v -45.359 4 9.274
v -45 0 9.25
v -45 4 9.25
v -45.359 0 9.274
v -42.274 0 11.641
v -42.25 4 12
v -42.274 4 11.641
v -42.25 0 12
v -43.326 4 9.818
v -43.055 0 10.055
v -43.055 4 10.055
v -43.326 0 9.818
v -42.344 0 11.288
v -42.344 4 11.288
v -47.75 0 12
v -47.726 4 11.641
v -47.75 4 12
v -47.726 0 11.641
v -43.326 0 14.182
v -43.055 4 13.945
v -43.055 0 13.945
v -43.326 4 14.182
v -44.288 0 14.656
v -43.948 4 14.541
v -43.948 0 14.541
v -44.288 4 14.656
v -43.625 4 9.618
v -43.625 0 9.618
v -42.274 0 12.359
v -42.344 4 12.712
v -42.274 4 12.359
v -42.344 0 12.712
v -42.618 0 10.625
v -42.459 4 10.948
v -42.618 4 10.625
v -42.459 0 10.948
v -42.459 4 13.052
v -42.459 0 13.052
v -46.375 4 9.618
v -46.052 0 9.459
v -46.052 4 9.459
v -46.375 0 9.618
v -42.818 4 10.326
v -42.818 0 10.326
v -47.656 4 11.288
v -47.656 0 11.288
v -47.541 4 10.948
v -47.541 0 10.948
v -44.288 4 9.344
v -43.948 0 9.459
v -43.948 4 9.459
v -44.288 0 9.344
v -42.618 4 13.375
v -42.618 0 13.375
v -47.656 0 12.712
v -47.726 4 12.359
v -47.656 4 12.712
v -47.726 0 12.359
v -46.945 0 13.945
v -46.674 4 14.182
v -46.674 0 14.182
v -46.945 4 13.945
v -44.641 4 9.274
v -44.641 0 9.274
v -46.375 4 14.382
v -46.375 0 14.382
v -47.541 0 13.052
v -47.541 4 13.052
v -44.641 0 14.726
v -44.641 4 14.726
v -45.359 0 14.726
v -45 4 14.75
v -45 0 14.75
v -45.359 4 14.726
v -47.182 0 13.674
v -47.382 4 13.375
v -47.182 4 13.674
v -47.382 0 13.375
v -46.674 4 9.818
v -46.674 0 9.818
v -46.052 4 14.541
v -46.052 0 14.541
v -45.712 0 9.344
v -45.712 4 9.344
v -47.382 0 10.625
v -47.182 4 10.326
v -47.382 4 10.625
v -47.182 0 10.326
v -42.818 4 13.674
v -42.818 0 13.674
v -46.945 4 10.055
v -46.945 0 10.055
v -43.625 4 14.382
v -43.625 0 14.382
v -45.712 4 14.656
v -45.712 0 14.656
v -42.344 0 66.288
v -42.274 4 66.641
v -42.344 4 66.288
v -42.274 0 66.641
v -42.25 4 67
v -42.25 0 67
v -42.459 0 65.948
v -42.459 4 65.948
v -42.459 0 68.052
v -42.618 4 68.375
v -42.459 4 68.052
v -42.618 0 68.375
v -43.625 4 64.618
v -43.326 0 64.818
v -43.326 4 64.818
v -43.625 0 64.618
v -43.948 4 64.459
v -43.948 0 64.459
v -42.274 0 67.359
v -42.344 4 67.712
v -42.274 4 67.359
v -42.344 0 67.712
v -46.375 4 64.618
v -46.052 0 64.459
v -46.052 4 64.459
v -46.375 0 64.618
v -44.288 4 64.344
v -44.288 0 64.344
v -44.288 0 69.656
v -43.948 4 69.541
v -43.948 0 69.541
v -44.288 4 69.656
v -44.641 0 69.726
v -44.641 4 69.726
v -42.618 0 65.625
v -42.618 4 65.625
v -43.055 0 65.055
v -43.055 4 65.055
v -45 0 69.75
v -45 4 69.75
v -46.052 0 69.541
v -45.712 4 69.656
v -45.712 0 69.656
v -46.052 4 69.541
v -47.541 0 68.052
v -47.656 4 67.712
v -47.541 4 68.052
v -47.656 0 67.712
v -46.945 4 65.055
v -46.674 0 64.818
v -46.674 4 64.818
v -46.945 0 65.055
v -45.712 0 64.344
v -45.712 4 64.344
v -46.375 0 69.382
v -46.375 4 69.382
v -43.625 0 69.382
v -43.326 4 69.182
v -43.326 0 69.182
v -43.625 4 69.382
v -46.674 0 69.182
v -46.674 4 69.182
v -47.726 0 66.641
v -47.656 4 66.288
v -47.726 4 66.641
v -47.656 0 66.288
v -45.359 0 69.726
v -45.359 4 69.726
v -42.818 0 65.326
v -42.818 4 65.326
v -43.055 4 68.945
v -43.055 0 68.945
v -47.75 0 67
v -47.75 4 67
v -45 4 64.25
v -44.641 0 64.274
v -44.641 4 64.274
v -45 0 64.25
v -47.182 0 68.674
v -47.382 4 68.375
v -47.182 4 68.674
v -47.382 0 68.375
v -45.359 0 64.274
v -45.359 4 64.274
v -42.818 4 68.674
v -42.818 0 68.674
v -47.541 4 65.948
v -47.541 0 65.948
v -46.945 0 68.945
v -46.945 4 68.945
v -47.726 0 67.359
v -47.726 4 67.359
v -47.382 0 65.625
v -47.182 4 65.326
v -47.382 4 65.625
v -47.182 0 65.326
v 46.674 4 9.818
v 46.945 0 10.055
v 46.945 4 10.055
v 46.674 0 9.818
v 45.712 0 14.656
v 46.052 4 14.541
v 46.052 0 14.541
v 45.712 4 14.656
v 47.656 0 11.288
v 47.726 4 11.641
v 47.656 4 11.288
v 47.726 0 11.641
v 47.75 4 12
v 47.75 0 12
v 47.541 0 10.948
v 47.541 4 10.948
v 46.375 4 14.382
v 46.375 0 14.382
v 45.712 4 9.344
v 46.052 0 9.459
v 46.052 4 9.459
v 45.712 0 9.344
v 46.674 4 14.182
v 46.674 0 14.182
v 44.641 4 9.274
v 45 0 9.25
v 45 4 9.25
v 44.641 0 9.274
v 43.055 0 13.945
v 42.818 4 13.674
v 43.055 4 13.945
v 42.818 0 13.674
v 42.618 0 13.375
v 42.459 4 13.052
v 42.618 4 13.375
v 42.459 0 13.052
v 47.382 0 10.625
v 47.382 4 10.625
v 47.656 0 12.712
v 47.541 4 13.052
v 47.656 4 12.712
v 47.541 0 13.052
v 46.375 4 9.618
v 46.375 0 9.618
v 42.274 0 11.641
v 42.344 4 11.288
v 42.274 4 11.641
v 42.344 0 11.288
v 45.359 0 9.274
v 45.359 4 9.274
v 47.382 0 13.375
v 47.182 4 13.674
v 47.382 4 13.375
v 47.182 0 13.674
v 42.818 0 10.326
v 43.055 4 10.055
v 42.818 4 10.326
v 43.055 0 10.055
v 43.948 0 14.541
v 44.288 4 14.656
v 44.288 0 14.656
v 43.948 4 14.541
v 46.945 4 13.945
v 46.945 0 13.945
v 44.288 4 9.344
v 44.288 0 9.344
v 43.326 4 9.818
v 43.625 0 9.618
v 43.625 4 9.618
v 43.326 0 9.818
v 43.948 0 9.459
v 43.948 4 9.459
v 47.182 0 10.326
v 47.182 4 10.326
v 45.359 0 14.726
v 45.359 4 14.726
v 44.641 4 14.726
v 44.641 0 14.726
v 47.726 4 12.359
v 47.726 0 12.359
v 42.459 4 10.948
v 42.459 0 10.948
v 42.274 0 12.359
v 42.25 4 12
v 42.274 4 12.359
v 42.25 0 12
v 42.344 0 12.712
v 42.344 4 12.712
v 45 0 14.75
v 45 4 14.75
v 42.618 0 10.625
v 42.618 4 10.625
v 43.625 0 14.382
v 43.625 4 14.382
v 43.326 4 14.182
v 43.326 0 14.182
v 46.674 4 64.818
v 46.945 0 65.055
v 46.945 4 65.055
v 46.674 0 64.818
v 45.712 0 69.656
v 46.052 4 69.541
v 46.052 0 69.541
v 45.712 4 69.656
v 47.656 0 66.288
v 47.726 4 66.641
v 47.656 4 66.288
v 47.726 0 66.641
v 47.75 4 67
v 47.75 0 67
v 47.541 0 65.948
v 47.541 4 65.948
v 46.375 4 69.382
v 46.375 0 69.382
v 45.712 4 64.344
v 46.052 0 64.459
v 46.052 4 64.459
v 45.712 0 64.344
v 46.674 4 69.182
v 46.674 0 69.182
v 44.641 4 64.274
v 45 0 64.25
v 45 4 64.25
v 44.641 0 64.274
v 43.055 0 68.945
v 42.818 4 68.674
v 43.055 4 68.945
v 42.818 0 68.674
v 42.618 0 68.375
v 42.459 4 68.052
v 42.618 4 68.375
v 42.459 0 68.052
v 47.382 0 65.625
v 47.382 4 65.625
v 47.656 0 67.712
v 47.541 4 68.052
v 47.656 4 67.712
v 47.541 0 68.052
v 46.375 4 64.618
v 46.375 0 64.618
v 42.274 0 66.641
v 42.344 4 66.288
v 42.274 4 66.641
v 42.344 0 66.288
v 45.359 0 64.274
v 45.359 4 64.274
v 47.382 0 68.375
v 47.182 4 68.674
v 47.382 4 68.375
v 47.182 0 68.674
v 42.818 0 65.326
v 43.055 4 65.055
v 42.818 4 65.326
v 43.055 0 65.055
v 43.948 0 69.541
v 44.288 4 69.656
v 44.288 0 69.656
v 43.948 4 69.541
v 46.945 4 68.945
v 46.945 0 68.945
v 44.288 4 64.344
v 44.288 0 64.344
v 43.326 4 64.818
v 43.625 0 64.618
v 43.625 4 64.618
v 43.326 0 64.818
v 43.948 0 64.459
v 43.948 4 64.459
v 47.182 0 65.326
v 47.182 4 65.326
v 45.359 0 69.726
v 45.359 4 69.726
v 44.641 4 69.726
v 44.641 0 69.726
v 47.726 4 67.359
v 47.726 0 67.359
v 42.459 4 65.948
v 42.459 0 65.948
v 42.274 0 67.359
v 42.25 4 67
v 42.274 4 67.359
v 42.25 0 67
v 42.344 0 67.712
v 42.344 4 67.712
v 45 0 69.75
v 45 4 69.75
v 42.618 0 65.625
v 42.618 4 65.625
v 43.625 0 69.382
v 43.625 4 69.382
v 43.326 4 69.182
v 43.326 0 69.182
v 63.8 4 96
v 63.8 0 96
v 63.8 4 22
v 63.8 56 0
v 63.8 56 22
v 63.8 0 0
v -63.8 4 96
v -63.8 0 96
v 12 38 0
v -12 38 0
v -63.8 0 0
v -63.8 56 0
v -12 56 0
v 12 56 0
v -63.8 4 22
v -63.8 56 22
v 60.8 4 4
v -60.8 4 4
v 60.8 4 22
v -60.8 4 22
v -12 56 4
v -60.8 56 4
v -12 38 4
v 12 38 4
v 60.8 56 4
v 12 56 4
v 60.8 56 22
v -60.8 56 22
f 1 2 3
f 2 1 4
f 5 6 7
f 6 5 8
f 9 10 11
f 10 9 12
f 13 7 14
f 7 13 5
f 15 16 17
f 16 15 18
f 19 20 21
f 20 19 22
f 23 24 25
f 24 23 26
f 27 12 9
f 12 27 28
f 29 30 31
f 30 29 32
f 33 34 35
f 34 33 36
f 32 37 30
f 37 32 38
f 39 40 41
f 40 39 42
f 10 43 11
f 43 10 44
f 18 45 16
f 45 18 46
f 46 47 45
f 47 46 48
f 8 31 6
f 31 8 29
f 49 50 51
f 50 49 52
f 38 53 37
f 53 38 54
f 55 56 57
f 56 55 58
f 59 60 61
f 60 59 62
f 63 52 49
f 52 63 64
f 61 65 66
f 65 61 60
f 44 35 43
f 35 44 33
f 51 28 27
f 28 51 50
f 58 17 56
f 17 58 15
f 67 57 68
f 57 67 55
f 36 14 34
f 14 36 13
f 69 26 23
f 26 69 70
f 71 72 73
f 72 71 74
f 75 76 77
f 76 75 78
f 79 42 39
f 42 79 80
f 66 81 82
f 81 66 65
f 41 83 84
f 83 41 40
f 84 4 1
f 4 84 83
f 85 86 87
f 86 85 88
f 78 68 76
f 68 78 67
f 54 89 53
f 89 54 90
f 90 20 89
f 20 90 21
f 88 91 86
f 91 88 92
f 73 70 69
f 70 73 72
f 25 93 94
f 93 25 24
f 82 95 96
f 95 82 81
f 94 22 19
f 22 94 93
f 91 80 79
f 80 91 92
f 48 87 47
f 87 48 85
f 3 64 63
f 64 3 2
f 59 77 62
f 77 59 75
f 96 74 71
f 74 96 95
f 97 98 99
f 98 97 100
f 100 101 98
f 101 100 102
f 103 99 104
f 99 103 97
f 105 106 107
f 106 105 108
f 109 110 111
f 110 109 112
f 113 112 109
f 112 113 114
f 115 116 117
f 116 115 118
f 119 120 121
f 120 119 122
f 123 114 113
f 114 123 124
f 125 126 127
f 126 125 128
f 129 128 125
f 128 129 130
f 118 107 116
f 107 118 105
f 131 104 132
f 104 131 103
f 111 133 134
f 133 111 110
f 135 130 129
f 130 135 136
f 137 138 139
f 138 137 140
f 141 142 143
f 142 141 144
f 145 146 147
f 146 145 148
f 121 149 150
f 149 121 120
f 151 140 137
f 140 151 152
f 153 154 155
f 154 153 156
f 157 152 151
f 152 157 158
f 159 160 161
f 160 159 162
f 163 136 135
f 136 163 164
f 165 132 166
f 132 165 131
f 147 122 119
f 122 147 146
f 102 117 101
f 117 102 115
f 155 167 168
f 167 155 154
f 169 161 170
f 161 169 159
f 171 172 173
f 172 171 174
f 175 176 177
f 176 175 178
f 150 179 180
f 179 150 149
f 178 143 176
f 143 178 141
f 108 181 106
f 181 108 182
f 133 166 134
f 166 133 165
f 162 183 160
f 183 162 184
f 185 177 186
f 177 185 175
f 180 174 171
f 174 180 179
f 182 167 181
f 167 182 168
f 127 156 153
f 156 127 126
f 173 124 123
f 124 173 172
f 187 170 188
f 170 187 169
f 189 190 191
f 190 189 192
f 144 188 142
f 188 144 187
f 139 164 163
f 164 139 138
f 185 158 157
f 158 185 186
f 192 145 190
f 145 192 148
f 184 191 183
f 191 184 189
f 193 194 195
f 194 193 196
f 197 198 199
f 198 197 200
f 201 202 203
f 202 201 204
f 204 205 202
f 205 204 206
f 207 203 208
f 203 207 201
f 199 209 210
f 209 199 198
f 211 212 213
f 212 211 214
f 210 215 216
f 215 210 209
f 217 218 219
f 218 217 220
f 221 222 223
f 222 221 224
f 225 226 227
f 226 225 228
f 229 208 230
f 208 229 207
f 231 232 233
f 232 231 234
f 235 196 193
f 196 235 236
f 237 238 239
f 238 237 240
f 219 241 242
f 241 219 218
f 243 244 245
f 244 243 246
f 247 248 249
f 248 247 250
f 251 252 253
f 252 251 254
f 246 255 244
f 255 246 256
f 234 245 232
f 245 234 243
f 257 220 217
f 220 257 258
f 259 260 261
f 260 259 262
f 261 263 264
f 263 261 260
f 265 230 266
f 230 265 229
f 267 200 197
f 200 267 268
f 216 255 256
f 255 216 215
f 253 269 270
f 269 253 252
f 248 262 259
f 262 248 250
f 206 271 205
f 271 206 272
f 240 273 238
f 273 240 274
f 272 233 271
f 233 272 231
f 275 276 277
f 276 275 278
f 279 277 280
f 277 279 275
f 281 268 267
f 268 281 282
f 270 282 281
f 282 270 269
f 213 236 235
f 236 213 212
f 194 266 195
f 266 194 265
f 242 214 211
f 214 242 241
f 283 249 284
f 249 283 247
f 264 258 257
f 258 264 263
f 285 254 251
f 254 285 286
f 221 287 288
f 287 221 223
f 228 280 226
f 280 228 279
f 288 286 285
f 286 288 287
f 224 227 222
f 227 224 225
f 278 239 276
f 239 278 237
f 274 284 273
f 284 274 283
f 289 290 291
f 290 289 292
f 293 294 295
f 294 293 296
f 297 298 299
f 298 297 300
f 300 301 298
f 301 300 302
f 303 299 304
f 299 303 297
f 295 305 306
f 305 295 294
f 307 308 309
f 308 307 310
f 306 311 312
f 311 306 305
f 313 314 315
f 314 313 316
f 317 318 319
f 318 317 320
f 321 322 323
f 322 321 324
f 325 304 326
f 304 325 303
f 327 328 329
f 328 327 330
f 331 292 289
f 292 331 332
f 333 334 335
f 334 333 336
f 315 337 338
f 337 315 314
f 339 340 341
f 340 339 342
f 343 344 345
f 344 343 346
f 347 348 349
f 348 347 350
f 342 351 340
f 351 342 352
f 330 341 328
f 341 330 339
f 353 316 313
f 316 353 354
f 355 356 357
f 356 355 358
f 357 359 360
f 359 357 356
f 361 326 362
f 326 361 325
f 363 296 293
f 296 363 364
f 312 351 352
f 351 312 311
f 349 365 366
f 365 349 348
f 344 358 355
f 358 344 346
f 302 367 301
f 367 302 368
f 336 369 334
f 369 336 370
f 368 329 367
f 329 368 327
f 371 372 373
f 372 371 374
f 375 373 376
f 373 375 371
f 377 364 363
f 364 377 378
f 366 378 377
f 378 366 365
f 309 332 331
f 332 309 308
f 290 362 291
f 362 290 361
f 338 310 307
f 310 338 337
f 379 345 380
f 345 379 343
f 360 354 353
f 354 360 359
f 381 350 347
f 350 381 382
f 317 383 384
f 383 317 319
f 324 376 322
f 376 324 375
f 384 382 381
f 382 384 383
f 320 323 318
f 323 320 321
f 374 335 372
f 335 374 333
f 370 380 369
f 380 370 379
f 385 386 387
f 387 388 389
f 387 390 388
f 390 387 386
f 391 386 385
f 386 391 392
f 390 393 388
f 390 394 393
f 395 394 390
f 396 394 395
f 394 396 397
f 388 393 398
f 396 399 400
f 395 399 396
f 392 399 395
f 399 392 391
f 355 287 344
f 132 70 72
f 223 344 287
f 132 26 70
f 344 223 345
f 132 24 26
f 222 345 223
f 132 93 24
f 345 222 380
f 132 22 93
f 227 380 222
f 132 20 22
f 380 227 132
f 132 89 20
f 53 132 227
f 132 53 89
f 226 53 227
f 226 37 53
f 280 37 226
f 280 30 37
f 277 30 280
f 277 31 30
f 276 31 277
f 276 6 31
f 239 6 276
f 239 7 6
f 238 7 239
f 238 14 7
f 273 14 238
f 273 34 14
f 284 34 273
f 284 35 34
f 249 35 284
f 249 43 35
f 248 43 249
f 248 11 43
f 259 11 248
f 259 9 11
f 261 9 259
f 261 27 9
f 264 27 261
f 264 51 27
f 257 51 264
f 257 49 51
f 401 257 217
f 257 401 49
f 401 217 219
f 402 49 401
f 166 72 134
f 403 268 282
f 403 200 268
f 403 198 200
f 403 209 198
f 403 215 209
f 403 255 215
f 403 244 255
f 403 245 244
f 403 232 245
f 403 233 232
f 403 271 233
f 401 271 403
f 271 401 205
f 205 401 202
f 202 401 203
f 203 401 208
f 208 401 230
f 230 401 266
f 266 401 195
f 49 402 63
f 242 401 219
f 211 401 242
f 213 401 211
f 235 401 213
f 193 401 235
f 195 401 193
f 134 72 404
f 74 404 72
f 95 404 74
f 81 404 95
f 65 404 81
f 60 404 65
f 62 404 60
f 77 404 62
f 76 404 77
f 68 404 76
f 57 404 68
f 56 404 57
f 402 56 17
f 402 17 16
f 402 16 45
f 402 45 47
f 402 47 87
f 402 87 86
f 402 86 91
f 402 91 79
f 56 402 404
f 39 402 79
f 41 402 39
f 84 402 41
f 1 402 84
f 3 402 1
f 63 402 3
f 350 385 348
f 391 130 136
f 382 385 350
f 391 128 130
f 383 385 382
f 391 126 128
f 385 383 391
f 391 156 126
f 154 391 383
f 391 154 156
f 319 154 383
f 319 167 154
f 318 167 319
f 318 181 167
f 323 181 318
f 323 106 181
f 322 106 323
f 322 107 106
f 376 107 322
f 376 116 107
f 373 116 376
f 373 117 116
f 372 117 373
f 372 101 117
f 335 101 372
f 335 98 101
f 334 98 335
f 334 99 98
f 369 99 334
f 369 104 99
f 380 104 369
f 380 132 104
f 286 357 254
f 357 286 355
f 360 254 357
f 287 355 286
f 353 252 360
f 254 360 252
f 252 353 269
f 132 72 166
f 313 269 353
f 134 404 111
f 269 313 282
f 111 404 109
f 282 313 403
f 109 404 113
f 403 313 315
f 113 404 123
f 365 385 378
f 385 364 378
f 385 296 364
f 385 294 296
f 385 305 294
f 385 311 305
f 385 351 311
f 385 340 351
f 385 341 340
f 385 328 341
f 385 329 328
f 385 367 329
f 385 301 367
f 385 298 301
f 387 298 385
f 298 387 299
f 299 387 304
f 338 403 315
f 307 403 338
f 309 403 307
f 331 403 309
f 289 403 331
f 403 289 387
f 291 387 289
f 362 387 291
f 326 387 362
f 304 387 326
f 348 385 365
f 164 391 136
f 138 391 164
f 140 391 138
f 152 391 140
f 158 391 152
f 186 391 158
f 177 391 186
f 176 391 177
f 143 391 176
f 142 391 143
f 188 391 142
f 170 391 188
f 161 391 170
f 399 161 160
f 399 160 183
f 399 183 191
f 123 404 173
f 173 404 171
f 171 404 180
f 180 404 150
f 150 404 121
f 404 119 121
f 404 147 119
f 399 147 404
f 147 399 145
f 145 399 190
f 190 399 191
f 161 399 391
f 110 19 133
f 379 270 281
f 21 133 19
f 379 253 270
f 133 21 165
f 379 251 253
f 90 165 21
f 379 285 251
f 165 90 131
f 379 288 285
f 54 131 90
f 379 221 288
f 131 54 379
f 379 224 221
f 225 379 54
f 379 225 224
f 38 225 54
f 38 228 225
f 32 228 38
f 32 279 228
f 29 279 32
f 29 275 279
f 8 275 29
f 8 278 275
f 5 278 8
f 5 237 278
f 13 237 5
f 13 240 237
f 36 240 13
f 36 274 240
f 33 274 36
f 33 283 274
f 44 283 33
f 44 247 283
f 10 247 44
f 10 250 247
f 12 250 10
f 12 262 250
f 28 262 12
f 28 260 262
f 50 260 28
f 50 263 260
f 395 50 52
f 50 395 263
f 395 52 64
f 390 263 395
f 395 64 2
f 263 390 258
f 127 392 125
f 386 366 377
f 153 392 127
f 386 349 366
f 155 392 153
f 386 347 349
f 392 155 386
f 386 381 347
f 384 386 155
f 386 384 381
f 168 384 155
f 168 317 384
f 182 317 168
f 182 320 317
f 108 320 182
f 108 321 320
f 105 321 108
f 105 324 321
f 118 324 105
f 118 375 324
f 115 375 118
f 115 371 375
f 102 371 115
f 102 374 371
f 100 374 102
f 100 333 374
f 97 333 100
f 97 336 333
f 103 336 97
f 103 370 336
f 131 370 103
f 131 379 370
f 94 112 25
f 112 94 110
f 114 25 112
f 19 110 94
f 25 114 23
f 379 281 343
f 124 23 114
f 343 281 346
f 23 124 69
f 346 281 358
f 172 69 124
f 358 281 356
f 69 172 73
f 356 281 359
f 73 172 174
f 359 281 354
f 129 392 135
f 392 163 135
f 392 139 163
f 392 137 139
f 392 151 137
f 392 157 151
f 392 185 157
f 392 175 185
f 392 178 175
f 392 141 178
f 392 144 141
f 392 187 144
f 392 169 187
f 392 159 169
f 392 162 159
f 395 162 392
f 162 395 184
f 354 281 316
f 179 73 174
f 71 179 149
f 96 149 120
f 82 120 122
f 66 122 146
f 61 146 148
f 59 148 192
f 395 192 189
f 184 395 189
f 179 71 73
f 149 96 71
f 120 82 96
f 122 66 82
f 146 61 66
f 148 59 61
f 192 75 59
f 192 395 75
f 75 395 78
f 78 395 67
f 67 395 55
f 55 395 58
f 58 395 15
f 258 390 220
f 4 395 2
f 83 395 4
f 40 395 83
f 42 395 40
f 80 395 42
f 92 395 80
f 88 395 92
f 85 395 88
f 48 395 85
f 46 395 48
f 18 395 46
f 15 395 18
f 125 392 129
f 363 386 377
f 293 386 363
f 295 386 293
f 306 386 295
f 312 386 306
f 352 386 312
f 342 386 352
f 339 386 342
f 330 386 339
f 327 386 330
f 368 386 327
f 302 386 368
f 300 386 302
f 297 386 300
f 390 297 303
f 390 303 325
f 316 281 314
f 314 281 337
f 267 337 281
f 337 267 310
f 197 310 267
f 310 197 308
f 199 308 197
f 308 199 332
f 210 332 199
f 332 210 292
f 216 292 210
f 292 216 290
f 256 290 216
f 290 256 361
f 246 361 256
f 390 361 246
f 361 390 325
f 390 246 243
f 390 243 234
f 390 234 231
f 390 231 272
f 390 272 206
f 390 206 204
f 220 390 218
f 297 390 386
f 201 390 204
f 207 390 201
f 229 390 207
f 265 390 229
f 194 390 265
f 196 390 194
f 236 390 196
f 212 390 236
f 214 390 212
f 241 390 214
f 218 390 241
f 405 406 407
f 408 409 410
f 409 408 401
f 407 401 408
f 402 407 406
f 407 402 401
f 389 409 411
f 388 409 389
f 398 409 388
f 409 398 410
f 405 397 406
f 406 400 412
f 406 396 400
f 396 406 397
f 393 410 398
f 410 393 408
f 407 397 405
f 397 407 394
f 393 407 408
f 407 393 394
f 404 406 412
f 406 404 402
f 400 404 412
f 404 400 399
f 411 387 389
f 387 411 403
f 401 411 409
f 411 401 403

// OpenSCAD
// AF-CAD-703 — AquaNode Mini wall-bracket starter
// Student task: complete and validate the model without hiding assumptions.

$fn = 48;

enclosure_width = 120;
enclosure_height = 80;
enclosure_depth = 45;
side_clearance = 0.8;

back_plate_thickness = 4;
shelf_thickness = 4;
shelf_depth = 52;
side_lip_thickness = 3;
side_lip_height = 18;

cable_opening_width = 24;
cable_opening_depth = 18;

hole_spacing_x = 90;
hole_spacing_z = 55;
mount_hole_diameter = 5.5;
plate_margin = 12;

plate_width = max(enclosure_width + 2 * (side_clearance + side_lip_thickness), hole_spacing_x + 2 * plate_margin);
plate_height = max(enclosure_height + shelf_thickness + plate_margin, hole_spacing_z + 2 * plate_margin);

module mounting_holes() {
    for (x = [-hole_spacing_x / 2, hole_spacing_x / 2])
        for (z = [plate_margin, plate_margin + hole_spacing_z])
            translate([x, -1, z])
                rotate([-90, 0, 0])
                    cylinder(h = back_plate_thickness + 2, d = mount_hole_diameter);
}

module back_plate() {
    difference() {
        translate([-plate_width / 2, 0, 0])
            cube([plate_width, back_plate_thickness, plate_height]);
        mounting_holes();
    }
}

module lower_shelf() {
    difference() {
        translate([-plate_width / 2, back_plate_thickness, 0])
            cube([plate_width, shelf_depth, shelf_thickness]);
        translate([-cable_opening_width / 2, back_plate_thickness + shelf_depth - cable_opening_depth, -1])
            cube([cable_opening_width, cable_opening_depth + 1, shelf_thickness + 2]);
    }
}

module side_lips() {
    inside_width = enclosure_width + 2 * side_clearance;
    for (side = [-1, 1])
        translate([side * inside_width / 2 - (side < 0 ? side_lip_thickness : 0),
                   back_plate_thickness,
                   shelf_thickness])
            cube([side_lip_thickness, shelf_depth, side_lip_height]);
}

module bracket() {
    union() {
        back_plate();
        lower_shelf();
        side_lips();
    }
}

bracket();

// Suggested checks:
// echo("plate_width", plate_width);
// echo("plate_height", plate_height);
// echo("inside_width", enclosure_width + 2 * side_clearance);
